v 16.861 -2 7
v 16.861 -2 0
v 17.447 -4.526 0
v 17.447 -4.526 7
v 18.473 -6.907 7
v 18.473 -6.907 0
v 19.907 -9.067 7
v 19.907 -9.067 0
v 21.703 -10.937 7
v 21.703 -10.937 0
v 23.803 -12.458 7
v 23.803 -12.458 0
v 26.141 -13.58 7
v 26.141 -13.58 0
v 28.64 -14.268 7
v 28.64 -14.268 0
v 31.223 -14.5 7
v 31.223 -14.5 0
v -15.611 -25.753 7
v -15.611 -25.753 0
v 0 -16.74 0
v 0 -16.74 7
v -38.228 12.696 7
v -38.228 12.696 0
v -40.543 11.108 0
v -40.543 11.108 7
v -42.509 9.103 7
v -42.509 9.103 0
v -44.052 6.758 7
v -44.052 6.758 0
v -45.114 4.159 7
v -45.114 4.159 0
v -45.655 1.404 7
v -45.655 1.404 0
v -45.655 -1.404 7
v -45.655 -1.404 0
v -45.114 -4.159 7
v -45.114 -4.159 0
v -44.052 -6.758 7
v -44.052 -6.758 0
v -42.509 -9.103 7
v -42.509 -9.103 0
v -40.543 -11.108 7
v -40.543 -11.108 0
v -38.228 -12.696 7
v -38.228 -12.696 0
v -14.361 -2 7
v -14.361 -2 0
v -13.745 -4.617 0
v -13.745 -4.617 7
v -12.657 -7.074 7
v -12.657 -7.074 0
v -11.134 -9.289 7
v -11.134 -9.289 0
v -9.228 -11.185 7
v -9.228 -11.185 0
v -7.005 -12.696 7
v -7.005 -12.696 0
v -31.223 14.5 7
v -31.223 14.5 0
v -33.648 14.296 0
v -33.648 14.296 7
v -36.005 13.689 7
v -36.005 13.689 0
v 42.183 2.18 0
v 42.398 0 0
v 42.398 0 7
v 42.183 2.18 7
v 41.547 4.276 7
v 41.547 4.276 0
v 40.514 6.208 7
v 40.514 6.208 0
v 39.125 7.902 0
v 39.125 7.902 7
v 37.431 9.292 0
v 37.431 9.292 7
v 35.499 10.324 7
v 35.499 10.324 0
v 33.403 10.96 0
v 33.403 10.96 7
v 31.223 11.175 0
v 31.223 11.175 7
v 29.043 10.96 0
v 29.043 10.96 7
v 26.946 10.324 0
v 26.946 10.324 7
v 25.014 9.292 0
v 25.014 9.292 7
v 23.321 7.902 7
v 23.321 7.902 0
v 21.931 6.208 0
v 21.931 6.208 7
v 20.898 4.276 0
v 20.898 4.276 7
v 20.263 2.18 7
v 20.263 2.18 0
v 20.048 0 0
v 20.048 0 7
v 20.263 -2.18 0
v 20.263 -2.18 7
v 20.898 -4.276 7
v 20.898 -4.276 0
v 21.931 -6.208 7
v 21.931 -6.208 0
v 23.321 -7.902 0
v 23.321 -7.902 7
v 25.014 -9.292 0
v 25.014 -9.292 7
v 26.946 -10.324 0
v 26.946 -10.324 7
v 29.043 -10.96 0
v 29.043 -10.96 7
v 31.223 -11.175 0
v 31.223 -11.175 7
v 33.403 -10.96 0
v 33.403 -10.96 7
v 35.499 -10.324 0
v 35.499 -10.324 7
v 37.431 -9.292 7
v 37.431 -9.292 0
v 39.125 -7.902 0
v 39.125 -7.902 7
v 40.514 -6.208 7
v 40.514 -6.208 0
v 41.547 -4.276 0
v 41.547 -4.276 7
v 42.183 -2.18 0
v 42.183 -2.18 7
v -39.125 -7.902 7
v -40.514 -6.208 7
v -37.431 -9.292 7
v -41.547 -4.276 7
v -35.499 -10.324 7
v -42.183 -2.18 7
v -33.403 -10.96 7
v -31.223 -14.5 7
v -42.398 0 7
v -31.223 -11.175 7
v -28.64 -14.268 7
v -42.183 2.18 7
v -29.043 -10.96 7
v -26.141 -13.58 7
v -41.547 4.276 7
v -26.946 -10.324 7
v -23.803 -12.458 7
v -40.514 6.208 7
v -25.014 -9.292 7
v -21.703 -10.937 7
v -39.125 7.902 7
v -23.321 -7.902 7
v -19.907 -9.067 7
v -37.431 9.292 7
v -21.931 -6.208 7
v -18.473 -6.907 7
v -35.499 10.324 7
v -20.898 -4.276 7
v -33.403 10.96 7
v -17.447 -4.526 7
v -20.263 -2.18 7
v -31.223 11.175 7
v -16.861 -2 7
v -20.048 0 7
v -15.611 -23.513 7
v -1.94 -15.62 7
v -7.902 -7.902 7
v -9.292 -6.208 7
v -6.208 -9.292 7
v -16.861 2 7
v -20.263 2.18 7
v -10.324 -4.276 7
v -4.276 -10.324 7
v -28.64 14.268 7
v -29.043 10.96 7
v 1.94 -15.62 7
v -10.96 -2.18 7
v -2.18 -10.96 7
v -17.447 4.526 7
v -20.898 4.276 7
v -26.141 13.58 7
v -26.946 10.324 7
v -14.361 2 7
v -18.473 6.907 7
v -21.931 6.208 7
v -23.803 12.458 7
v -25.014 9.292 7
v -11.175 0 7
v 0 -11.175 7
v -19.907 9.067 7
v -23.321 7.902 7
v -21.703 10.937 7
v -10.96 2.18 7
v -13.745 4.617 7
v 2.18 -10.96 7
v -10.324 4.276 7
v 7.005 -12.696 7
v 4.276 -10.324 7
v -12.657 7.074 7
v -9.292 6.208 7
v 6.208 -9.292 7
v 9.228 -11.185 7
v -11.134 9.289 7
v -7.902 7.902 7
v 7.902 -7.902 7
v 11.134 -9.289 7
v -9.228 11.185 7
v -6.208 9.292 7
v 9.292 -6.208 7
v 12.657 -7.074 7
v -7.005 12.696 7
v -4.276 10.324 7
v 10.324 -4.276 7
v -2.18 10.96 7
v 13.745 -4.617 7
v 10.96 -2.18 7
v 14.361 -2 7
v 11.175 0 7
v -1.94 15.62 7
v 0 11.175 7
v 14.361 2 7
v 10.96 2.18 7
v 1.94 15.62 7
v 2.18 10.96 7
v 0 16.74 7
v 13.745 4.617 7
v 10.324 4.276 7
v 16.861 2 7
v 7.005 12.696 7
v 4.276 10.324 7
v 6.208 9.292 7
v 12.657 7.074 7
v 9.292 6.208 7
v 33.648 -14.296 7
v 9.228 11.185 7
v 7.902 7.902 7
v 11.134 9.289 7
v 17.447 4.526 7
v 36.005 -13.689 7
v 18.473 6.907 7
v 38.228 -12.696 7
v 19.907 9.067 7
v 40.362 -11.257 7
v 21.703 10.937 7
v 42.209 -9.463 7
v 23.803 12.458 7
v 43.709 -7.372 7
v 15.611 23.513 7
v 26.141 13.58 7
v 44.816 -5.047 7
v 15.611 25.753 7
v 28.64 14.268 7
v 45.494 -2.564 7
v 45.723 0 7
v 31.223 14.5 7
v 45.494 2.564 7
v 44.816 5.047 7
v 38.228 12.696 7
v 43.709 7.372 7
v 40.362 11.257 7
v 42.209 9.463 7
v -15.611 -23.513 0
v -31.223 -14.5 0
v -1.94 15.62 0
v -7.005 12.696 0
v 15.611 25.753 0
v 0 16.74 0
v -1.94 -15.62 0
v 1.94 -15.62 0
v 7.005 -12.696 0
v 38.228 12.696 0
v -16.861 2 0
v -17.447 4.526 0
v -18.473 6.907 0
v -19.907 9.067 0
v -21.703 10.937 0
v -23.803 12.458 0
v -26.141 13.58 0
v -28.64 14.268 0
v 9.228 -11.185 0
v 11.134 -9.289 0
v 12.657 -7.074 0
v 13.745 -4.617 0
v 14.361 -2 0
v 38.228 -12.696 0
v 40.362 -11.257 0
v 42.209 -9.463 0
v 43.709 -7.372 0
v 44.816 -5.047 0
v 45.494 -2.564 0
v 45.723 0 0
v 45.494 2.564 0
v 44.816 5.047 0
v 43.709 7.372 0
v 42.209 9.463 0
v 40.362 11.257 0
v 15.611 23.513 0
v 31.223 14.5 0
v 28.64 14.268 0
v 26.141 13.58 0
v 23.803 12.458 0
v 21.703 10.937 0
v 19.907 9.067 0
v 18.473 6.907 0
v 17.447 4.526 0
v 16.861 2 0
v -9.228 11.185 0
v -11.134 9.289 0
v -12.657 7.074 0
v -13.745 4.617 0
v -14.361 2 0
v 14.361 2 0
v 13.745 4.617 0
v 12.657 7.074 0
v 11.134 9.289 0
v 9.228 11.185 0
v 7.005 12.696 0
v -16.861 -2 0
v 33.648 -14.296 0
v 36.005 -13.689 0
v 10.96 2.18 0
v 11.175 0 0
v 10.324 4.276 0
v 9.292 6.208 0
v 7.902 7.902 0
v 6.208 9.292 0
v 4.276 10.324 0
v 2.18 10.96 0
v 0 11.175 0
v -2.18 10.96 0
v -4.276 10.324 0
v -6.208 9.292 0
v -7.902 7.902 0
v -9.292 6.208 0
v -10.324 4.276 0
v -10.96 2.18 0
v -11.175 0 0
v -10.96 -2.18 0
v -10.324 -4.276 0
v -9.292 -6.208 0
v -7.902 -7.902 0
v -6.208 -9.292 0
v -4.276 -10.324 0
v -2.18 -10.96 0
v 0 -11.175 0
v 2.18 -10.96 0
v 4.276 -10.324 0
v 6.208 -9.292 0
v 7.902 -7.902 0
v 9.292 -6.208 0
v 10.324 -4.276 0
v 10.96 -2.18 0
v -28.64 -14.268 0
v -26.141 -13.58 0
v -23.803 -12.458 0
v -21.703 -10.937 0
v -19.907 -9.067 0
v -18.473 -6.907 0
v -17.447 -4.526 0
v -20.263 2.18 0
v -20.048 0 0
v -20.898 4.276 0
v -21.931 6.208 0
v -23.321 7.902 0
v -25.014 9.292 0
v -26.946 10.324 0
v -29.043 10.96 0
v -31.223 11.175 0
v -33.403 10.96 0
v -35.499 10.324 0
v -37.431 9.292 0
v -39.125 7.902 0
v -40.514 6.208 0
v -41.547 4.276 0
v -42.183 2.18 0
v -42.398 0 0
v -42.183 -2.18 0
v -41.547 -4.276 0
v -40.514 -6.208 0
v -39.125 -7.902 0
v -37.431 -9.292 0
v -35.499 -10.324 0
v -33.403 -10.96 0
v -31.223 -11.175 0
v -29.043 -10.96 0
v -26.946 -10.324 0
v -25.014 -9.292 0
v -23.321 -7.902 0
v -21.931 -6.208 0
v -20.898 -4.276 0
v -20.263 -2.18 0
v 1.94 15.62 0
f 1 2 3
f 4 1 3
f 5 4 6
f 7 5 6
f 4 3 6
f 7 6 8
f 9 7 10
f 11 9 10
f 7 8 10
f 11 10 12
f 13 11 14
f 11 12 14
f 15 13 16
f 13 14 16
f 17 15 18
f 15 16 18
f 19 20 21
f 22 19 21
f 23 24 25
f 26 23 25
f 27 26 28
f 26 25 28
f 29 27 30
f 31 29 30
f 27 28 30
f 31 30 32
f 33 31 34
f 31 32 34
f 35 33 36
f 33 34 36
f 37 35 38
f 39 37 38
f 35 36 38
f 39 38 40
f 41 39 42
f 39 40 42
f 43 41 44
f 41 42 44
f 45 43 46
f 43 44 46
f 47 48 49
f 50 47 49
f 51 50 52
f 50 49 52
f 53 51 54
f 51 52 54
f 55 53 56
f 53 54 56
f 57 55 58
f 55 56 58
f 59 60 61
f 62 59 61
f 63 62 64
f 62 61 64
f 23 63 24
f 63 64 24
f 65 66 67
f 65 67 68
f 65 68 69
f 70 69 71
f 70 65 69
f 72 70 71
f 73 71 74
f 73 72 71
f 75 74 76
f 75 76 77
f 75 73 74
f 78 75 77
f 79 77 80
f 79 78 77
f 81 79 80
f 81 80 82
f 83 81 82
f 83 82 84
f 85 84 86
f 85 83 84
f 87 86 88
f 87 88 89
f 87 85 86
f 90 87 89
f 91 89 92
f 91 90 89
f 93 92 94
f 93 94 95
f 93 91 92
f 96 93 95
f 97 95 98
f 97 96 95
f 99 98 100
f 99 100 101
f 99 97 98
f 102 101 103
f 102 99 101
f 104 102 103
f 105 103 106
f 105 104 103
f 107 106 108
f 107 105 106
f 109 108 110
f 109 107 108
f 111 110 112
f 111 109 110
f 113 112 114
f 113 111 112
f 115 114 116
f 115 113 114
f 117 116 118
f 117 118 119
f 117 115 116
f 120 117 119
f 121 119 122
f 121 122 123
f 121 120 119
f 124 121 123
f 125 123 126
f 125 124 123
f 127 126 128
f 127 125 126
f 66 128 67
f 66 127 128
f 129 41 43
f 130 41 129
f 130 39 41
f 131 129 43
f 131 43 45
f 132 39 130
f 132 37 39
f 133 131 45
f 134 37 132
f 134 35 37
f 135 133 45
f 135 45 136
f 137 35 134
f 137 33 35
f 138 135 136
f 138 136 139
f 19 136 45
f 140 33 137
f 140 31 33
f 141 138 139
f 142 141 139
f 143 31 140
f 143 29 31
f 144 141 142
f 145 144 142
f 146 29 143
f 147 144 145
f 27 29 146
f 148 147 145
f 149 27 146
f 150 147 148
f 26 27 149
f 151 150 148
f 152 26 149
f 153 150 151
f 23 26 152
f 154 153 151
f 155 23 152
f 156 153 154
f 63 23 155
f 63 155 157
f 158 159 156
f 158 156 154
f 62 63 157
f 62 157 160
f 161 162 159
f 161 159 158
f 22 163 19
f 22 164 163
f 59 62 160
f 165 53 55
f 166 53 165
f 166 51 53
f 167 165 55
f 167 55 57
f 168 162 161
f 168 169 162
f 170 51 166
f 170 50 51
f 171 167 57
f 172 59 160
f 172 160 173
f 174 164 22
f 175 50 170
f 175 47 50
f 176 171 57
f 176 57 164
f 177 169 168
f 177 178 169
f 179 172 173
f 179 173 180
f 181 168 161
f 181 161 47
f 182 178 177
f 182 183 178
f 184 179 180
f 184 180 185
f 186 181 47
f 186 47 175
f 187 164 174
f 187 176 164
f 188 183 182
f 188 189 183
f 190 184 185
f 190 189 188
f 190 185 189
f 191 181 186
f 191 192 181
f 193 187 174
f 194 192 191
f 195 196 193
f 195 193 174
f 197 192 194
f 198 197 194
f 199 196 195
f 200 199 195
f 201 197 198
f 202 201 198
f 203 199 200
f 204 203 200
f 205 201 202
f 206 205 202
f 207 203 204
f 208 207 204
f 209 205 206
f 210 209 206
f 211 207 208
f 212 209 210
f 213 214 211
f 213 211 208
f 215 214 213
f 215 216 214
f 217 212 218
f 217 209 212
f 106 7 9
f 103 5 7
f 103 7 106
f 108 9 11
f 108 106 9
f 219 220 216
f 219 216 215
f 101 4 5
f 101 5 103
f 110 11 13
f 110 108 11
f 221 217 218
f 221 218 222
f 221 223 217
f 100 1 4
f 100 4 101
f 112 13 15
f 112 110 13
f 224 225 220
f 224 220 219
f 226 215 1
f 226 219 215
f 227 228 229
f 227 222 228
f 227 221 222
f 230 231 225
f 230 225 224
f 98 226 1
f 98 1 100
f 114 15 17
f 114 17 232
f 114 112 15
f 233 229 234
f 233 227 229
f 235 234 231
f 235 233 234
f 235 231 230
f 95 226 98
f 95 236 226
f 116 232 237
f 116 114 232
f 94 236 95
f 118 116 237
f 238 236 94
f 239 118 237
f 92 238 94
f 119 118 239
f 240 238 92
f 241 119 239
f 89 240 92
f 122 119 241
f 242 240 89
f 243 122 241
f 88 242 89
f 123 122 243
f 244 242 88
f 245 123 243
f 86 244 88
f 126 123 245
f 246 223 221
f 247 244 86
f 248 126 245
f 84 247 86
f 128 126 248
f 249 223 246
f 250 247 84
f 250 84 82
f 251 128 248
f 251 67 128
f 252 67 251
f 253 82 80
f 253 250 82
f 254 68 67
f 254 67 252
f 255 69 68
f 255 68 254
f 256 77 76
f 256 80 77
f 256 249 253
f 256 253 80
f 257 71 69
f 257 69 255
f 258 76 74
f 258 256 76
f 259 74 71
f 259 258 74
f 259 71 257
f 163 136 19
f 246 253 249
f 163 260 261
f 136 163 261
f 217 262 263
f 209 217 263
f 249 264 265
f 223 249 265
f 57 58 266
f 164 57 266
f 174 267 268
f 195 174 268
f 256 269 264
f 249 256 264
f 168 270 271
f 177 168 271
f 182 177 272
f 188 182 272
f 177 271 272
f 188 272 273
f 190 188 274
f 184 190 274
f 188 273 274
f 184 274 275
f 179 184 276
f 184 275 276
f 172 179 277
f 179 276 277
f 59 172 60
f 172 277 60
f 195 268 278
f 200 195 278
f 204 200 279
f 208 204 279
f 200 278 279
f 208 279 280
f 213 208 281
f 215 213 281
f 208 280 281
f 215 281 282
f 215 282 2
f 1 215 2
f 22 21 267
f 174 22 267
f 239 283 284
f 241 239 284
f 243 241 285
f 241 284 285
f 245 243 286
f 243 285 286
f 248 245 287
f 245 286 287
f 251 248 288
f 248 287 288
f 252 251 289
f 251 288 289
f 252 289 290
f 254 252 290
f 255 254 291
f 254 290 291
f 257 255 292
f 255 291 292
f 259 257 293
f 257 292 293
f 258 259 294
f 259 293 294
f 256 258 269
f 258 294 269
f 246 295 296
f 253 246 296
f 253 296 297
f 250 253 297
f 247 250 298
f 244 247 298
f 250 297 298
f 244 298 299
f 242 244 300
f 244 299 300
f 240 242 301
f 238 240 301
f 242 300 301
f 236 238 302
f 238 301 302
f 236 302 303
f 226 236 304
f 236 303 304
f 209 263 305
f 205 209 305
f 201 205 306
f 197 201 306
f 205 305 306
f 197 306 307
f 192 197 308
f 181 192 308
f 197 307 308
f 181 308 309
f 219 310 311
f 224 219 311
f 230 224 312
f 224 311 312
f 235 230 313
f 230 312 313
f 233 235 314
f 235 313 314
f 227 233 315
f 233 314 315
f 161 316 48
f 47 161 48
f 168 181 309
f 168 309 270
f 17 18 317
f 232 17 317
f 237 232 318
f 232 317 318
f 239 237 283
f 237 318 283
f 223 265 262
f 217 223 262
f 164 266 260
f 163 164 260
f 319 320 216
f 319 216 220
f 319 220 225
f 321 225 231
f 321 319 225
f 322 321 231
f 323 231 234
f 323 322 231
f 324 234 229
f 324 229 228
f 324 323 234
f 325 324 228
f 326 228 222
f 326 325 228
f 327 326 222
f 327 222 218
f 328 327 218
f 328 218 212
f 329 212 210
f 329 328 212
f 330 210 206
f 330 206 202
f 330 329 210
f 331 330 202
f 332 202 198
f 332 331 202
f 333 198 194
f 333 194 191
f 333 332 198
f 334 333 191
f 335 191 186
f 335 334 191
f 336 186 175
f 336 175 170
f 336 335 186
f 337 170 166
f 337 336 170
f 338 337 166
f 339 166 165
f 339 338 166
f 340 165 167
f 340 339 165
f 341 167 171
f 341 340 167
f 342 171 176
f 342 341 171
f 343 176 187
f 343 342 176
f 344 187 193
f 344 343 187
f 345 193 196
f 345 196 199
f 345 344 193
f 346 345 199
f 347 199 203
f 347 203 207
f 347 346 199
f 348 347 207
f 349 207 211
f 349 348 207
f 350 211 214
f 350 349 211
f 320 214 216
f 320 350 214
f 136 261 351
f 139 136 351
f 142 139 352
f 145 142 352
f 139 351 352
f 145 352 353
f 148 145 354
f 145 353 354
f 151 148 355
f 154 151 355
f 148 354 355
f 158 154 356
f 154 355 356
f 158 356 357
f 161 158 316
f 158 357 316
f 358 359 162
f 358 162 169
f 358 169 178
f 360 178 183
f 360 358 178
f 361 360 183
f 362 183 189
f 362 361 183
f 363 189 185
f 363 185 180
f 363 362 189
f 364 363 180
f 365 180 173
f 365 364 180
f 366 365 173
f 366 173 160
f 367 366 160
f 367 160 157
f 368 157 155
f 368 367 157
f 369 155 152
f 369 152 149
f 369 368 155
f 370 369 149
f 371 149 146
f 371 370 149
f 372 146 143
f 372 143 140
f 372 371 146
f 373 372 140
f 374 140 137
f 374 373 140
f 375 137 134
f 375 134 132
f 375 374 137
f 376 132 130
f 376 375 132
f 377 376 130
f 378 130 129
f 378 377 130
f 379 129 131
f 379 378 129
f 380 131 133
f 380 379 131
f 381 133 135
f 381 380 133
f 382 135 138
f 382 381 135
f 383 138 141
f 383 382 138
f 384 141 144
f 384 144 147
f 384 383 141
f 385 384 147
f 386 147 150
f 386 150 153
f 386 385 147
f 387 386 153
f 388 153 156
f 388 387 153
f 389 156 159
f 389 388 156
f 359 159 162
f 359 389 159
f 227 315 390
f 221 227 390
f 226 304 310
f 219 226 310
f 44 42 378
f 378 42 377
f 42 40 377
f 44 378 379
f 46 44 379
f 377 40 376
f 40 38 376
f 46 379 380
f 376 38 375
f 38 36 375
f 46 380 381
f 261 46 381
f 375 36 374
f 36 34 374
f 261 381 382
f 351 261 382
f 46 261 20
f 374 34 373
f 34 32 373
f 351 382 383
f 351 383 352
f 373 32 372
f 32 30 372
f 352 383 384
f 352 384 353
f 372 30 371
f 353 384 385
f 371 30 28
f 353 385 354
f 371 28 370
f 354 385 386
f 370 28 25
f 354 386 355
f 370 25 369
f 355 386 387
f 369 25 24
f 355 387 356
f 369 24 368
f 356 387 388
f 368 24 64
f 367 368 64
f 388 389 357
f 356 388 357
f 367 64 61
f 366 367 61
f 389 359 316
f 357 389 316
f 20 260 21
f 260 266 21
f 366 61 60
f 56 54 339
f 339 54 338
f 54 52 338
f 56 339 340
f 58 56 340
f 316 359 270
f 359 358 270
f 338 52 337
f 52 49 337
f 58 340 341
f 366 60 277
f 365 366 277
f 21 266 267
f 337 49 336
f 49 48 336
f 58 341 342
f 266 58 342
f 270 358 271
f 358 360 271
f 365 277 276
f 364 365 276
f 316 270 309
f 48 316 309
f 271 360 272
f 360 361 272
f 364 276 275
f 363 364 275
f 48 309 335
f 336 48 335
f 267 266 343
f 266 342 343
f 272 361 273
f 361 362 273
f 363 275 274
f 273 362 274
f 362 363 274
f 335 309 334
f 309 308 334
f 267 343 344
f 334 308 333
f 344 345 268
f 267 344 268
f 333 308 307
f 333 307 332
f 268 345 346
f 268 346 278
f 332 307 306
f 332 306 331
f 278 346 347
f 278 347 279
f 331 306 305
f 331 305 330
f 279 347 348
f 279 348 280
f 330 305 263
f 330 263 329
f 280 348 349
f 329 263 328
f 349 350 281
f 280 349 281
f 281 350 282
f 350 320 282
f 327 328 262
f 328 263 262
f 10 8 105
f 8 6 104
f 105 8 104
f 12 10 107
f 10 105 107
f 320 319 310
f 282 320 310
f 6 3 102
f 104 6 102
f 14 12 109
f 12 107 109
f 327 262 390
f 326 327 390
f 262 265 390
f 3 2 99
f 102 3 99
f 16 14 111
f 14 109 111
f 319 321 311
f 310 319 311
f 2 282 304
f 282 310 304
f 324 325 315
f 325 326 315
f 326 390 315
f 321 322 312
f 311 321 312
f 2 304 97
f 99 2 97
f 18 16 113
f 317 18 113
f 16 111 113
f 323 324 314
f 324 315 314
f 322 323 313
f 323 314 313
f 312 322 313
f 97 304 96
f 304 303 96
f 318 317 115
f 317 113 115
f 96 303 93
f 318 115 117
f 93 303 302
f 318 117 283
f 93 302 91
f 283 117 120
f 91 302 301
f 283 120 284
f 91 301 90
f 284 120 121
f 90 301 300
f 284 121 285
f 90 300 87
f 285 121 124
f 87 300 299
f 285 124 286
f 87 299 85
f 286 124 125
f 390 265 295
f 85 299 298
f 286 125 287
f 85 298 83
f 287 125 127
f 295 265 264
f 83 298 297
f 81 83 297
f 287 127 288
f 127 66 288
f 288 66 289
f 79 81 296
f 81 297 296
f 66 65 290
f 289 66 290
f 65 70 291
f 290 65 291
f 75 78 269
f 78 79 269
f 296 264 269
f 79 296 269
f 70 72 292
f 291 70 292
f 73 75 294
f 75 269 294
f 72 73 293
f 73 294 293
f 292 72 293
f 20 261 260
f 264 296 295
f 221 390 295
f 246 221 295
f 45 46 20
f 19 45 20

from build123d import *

# Parameters (mm, degrees)
F0_R     = 11.175
F1_DEPTH = 7


# Not quite as in the source:
# - a feature names something its author has since deleted; it is built from what else it names


with BuildPart() as f1:
    # F0 (on Top) → F1 (new body)
    with BuildSketch(Plane.XY):
        with BuildLine():
            ThreePointArc((14.3614066163, -2), (14.465310158, -1.0023981402), (14.5, 0))
            ThreePointArc((14.5, 0), (14.465310158, 1.0023981402), (14.3614066163, 2))
            ThreePointArc((14.3614066163, 2), (11.9468943762, 8.2171597748), (7.0047576617, 12.6958012784))
            ThreePointArc((7.0047576617, 12.6958012784), (3.6166891948, 14.0417078473), (0, 14.5))
            ThreePointArc((0, 14.5), (-3.6166891948, 14.0417078473), (-7.0047576617, 12.6958012784))
            ThreePointArc((-7.0047576617, 12.6958012784), (-11.9468943762, 8.2171597748), (-14.3614066163, 2))
            ThreePointArc((-14.3614066163, 2), (-14.5, 0), (-14.3614066163, -2))
            ThreePointArc((-14.3614066163, -2), (-11.9468943762, -8.2171597748), (-7.0047576617, -12.6958012784))
            ThreePointArc((-7.0047576617, -12.6958012784), (-3.6166891948, -14.0417078473), (0, -14.5))
            ThreePointArc((0, -14.5), (3.6166891948, -14.0417078473), (7.0047576617, -12.6958012784))
            ThreePointArc((7.0047576617, -12.6958012784), (11.9468943762, -8.2171597748), (14.3614066163, -2))
        make_face()
        Circle(F0_R, mode=Mode.SUBTRACT)
        with BuildLine():
            ThreePointArc((14.3614066163, 2), (14.465310158, 1.0023981402), (14.5, 0))
            ThreePointArc((14.5, 0), (14.465310158, -1.0023981402), (14.3614066163, -2))
            Line((14.3614066163, -2), (16.8614066163, -2))
            ThreePointArc((16.8614066163, -2), (16.7228132327, 0), (16.8614066163, 2))
            Line((16.8614066163, 2), (14.3614066163, 2))
        make_face()
        with BuildLine():
            ThreePointArc((0, 14.5), (3.6166891948, 14.0417078473), (7.0047576617, 12.6958012784))
            Line((7.0047576617, 12.6958012784), (1.9398969045, 15.62))
            Line((1.9398969045, 15.62), (0, 14.5))
        make_face()
        with BuildLine():
            ThreePointArc((31.2228132327, 14.5), (21.7030968504, 10.9373214271), (16.8614066163, 2))
            ThreePointArc((16.8614066163, 2), (16.7228132327, 0), (16.8614066163, -2))
            ThreePointArc((16.8614066163, -2), (21.7030968504, -10.9373214271), (31.2228132327, -14.5))
            ThreePointArc((31.2228132327, -14.5), (34.8395024275, -14.0417078473), (38.2275708944, -12.6958012784))
            ThreePointArc((38.2275708944, -12.6958012784), (43.709185526, -7.3716013832), (45.7228132327, 0))
            ThreePointArc((45.7228132327, 0), (43.709185526, 7.3716013832), (38.2275708944, 12.6958012784))
            ThreePointArc((38.2275708944, 12.6958012784), (34.8395024275, 14.0417078473), (31.2228132327, 14.5))
        make_face()
        with Locations((31.2228132327, 0)):
            Circle(F0_R, mode=Mode.SUBTRACT)
        with BuildLine():
            Line((1.9398969045, -15.62), (7.0047576617, -12.6958012784))
            ThreePointArc((7.0047576617, -12.6958012784), (3.6166891948, -14.0417078473), (0, -14.5))
            Line((0, -14.5), (1.9398969045, -15.62))
        make_face()
        Polygon((-1.9398969045, 15.62), (0, 14.5), (1.9398969045, 15.62), (0, 16.74), align=None)
        with BuildLine():
            ThreePointArc((-7.0047576617, 12.6958012784), (-3.6166891948, 14.0417078473), (0, 14.5))
            Line((0, 14.5), (-1.9398969045, 15.62))
            Line((-1.9398969045, 15.62), (-7.0047576617, 12.6958012784))
        make_face()
        Polygon((0, 16.74), (1.9398969045, 15.62), (15.6114066163, 23.5132498124), (15.6114066163, 25.7532498124), align=None)
        with BuildLine():
            Line((15.6114066163, 23.5132498124), (31.2228132327, 14.5))
            ThreePointArc((31.2228132327, 14.5), (34.8395024275, 14.0417078473), (38.2275708944, 12.6958012784))
            Line((38.2275708944, 12.6958012784), (15.6114066163, 25.7532498124))
            Line((15.6114066163, 25.7532498124), (15.6114066163, 23.5132498124))
        make_face()
        with BuildLine():
            Line((-1.9398969045, -15.62), (0, -14.5))
            ThreePointArc((0, -14.5), (-3.6166891948, -14.0417078473), (-7.0047576617, -12.6958012784))
            Line((-7.0047576617, -12.6958012784), (-1.9398969045, -15.62))
        make_face()
        Polygon((1.9398969045, -15.62), (0, -14.5), (-1.9398969045, -15.62), (0, -16.74), align=None)
        Polygon((0, -16.74), (-1.9398969045, -15.62), (-15.6114066163, -23.5132498124), (-15.6114066163, -25.7532498124), align=None)
        with BuildLine():
            ThreePointArc((-14.3614066163, -2), (-14.5, 0), (-14.3614066163, 2))
            Line((-14.3614066163, 2), (-16.8614066163, 2))
            ThreePointArc((-16.8614066163, 2), (-16.7575030746, 1.0023981402), (-16.7228132327, 0))
            ThreePointArc((-16.7228132327, 0), (-16.7575030746, -1.0023981402), (-16.8614066163, -2))
            Line((-16.8614066163, -2), (-14.3614066163, -2))
        make_face()
        with BuildLine():
            Line((-15.6114066163, -25.7532498124), (-15.6114066163, -23.5132498124))
            Line((-15.6114066163, -23.5132498124), (-31.2228132327, -14.5))
            ThreePointArc((-31.2228132327, -14.5), (-34.8395024275, -14.0417078473), (-38.2275708944, -12.6958012784))
            Line((-38.2275708944, -12.6958012784), (-15.6114066163, -25.7532498124))
        make_face()
        with BuildLine():
            ThreePointArc((-16.7228132327, 0), (-16.7575030746, 1.0023981402), (-16.8614066163, 2))
            ThreePointArc((-16.8614066163, 2), (-21.7030968504, 10.9373214271), (-31.2228132327, 14.5))
            ThreePointArc((-31.2228132327, 14.5), (-34.8395024275, 14.0417078473), (-38.2275708944, 12.6958012784))
            ThreePointArc((-38.2275708944, 12.6958012784), (-45.7228132327, 0), (-38.2275708944, -12.6958012784))
            ThreePointArc((-38.2275708944, -12.6958012784), (-34.8395024275, -14.0417078473), (-31.2228132327, -14.5))
            ThreePointArc((-31.2228132327, -14.5), (-21.7030968504, -10.9373214271), (-16.8614066163, -2))
            ThreePointArc((-16.8614066163, -2), (-16.7575030746, -1.0023981402), (-16.7228132327, 0))
        make_face()
        with Locations((-31.2228132327, 0)):
            Circle(F0_R, mode=Mode.SUBTRACT)
    extrude(amount=F1_DEPTH)


solid = f1.part
